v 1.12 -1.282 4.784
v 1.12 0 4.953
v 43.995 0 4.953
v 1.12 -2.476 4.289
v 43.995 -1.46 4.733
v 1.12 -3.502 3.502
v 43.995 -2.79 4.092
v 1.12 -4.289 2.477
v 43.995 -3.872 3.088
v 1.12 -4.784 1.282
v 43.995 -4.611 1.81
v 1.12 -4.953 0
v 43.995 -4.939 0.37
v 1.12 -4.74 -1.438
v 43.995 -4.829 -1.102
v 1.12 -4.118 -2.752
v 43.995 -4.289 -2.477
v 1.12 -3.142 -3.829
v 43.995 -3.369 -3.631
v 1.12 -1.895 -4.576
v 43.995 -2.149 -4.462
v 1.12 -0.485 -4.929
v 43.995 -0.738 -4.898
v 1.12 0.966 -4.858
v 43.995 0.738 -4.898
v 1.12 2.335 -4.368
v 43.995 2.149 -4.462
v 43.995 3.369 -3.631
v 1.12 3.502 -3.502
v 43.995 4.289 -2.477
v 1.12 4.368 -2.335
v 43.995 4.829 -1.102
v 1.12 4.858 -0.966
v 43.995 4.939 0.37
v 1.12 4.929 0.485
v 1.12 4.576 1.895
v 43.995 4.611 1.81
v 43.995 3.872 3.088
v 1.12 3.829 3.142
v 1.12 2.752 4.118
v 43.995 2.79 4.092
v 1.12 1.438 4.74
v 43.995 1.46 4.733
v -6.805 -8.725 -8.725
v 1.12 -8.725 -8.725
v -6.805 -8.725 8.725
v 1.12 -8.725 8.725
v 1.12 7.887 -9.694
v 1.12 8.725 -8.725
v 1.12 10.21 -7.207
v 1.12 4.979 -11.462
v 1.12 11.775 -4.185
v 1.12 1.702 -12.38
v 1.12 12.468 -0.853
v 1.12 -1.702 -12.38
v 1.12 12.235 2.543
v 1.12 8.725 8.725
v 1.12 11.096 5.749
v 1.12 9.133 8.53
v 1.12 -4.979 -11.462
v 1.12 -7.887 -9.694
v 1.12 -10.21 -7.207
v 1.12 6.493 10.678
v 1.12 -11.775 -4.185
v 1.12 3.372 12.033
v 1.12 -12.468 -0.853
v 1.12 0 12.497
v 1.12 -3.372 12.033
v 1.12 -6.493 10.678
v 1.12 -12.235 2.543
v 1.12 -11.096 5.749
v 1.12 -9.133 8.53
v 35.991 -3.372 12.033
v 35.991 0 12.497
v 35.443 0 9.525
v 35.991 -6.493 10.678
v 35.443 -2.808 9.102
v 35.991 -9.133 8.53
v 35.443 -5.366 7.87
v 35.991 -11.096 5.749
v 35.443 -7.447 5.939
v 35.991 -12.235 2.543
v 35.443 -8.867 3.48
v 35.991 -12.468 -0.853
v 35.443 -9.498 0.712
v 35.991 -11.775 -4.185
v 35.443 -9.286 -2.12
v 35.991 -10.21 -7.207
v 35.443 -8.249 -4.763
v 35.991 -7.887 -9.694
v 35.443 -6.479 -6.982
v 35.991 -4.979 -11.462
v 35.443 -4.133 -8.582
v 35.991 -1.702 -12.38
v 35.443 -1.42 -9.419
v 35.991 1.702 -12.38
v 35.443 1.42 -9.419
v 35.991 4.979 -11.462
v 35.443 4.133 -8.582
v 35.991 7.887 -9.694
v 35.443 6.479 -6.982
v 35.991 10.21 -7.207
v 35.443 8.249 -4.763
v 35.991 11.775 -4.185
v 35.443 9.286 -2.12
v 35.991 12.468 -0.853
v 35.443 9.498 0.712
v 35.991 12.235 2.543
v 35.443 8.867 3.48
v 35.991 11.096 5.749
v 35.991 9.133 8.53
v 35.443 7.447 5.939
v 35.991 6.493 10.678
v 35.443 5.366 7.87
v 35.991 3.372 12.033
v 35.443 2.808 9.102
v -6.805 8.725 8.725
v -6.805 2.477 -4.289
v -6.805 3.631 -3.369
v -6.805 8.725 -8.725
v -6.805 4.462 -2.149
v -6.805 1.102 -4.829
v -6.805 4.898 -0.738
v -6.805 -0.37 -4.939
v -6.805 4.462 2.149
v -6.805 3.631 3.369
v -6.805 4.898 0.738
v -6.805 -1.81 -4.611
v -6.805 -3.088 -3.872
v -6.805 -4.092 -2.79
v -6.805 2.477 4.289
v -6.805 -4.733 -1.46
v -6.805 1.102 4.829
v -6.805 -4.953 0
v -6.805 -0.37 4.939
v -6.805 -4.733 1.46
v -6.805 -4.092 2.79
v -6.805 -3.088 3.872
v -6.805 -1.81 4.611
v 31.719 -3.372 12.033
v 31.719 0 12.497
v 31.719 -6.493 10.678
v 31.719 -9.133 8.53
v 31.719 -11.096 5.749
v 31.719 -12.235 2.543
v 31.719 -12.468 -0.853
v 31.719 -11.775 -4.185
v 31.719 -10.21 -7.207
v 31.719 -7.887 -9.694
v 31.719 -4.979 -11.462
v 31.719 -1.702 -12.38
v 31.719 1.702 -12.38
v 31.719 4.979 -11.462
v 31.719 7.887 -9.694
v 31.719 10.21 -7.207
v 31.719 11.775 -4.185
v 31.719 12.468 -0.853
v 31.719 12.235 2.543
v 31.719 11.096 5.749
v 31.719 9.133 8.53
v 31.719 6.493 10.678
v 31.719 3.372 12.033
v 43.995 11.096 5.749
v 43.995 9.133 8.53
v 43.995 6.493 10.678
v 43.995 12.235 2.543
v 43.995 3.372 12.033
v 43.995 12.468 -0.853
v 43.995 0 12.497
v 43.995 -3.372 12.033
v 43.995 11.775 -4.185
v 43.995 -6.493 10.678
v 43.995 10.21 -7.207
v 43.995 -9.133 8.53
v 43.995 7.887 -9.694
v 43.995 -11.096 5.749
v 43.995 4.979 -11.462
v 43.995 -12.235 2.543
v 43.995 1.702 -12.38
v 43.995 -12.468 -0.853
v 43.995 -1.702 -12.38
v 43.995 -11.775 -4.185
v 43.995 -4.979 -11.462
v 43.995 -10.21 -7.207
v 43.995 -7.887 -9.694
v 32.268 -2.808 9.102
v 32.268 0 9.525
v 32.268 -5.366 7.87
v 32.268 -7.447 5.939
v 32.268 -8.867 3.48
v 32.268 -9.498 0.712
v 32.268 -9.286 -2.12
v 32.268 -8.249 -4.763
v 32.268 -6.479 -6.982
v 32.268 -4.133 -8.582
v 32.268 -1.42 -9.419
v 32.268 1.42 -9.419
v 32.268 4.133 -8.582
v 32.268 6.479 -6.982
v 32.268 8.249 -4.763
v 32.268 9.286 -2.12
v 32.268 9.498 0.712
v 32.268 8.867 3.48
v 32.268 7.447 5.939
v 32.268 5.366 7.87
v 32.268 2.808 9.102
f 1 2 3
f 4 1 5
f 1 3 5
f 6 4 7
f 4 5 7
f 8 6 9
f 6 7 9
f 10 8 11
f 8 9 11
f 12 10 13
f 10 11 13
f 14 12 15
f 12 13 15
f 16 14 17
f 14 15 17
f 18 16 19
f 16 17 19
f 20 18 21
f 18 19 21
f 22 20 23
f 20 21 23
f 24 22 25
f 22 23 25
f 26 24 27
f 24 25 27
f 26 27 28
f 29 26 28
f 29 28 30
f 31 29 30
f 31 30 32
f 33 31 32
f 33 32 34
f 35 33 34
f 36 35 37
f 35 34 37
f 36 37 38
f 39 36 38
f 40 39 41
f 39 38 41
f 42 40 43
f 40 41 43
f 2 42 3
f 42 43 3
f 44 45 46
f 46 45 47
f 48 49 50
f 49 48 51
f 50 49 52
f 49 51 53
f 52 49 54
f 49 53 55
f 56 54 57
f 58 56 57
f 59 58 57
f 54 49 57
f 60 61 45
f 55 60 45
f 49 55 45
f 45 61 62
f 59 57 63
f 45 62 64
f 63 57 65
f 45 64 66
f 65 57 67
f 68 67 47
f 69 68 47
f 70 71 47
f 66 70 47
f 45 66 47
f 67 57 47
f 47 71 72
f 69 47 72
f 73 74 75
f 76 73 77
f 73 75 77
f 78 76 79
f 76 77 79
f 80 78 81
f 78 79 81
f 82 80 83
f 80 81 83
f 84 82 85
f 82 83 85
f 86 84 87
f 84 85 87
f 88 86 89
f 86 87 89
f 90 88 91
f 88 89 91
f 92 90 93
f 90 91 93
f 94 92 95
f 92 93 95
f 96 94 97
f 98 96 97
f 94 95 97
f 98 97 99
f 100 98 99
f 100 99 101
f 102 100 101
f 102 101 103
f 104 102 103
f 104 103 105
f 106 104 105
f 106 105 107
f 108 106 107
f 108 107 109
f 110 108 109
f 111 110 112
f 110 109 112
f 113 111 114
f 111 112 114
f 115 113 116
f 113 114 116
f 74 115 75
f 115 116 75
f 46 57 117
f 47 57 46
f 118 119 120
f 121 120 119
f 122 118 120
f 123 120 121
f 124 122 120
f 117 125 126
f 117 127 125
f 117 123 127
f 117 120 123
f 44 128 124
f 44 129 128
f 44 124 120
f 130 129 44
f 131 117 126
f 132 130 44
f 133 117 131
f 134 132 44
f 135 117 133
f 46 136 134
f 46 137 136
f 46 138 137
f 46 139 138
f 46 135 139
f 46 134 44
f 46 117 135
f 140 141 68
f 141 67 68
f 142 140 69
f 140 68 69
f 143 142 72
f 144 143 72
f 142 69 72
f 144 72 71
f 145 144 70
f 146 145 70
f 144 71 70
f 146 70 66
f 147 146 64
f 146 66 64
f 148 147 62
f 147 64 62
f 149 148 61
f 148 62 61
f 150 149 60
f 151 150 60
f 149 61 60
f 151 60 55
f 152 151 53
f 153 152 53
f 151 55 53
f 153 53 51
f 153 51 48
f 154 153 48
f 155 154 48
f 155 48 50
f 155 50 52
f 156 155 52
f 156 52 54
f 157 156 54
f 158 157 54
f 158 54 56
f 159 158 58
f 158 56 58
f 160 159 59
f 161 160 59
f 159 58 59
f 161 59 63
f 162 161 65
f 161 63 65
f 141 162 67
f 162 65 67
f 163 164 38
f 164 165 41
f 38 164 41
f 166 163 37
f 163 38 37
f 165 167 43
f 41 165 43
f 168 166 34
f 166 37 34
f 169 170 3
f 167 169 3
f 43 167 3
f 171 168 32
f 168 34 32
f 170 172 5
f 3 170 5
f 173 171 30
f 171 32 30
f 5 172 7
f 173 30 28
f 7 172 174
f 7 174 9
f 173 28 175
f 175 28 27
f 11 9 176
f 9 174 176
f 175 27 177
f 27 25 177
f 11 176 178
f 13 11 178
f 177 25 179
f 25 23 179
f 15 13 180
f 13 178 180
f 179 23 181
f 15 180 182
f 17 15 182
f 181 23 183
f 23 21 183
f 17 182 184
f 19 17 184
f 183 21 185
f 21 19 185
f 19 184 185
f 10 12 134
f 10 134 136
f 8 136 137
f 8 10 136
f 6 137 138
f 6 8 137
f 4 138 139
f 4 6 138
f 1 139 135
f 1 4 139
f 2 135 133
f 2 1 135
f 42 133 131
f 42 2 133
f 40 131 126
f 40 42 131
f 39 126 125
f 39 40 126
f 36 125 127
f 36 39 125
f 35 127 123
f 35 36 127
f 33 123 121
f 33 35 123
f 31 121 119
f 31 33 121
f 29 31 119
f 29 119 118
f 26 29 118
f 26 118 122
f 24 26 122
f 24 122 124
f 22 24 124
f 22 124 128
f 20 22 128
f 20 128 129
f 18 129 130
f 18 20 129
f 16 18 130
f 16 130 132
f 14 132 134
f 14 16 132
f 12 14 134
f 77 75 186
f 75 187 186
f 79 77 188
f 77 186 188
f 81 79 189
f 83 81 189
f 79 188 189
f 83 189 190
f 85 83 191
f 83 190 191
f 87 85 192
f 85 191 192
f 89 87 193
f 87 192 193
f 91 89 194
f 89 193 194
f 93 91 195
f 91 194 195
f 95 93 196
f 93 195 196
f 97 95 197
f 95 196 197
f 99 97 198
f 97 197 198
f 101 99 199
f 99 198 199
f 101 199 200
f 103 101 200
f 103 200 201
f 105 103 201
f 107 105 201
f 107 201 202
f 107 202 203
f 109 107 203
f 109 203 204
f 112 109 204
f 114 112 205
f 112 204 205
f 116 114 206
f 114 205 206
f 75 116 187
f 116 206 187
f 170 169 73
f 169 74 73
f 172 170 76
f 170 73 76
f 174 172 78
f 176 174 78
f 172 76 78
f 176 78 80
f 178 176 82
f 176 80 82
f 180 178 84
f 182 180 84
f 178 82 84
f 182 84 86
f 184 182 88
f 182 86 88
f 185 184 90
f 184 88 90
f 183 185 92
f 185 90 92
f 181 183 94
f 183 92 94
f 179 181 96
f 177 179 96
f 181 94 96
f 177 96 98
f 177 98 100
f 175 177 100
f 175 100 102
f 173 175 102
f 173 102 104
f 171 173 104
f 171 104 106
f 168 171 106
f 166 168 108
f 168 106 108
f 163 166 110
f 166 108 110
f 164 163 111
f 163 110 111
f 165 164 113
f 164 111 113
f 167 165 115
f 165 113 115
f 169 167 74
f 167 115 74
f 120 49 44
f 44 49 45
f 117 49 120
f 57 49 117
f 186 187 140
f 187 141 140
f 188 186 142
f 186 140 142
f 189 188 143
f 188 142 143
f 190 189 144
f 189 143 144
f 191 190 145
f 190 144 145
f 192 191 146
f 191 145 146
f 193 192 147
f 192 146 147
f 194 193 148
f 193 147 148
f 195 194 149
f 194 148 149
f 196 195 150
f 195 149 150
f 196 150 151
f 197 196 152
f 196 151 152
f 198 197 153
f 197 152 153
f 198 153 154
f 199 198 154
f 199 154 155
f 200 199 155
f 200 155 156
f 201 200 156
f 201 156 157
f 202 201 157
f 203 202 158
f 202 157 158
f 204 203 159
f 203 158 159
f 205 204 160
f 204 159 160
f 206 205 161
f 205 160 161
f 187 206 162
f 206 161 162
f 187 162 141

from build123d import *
from build123d import SkipClean  # not in build123d's __all__

# Parameters (mm, degrees)
F2_W     = 17.4498
F2_H     = 17.4498
F2_R     = 4.953
F3_DEPTH = 7.9248


with BuildPart() as f1:
    # F0 (on Front) → F1 (revolve)
    with BuildSketch(Plane.XZ):
        Polygon((1.1196035955, 9.525), (1.1196035955, 4.953), (43.9948035955, 4.953), (43.9948035955, 12.4968), (35.9913689879, 12.4968), (35.4428738503, 9.525), (32.2678738503, 9.525), (31.7193787128, 12.4968), (1.1196035955, 12.4968), align=None)
    revolve(axis=Axis((1.9816491438, 0, 0), (1, 0, 0)))

    # F2 (on face) → F3 (join)
    with BuildSketch(Plane(origin=(1.1196035955, 0, 0), x_dir=(0, -1, 0), z_dir=(-1, 0, 0))):
        Rectangle(F2_W, F2_H)
        Circle(F2_R, mode=Mode.SUBTRACT)
    with SkipClean():  # cleaning this boolean's faces spoils the solid; the shape is the same uncleaned
        extrude(amount=F3_DEPTH)


solid = f1.part
